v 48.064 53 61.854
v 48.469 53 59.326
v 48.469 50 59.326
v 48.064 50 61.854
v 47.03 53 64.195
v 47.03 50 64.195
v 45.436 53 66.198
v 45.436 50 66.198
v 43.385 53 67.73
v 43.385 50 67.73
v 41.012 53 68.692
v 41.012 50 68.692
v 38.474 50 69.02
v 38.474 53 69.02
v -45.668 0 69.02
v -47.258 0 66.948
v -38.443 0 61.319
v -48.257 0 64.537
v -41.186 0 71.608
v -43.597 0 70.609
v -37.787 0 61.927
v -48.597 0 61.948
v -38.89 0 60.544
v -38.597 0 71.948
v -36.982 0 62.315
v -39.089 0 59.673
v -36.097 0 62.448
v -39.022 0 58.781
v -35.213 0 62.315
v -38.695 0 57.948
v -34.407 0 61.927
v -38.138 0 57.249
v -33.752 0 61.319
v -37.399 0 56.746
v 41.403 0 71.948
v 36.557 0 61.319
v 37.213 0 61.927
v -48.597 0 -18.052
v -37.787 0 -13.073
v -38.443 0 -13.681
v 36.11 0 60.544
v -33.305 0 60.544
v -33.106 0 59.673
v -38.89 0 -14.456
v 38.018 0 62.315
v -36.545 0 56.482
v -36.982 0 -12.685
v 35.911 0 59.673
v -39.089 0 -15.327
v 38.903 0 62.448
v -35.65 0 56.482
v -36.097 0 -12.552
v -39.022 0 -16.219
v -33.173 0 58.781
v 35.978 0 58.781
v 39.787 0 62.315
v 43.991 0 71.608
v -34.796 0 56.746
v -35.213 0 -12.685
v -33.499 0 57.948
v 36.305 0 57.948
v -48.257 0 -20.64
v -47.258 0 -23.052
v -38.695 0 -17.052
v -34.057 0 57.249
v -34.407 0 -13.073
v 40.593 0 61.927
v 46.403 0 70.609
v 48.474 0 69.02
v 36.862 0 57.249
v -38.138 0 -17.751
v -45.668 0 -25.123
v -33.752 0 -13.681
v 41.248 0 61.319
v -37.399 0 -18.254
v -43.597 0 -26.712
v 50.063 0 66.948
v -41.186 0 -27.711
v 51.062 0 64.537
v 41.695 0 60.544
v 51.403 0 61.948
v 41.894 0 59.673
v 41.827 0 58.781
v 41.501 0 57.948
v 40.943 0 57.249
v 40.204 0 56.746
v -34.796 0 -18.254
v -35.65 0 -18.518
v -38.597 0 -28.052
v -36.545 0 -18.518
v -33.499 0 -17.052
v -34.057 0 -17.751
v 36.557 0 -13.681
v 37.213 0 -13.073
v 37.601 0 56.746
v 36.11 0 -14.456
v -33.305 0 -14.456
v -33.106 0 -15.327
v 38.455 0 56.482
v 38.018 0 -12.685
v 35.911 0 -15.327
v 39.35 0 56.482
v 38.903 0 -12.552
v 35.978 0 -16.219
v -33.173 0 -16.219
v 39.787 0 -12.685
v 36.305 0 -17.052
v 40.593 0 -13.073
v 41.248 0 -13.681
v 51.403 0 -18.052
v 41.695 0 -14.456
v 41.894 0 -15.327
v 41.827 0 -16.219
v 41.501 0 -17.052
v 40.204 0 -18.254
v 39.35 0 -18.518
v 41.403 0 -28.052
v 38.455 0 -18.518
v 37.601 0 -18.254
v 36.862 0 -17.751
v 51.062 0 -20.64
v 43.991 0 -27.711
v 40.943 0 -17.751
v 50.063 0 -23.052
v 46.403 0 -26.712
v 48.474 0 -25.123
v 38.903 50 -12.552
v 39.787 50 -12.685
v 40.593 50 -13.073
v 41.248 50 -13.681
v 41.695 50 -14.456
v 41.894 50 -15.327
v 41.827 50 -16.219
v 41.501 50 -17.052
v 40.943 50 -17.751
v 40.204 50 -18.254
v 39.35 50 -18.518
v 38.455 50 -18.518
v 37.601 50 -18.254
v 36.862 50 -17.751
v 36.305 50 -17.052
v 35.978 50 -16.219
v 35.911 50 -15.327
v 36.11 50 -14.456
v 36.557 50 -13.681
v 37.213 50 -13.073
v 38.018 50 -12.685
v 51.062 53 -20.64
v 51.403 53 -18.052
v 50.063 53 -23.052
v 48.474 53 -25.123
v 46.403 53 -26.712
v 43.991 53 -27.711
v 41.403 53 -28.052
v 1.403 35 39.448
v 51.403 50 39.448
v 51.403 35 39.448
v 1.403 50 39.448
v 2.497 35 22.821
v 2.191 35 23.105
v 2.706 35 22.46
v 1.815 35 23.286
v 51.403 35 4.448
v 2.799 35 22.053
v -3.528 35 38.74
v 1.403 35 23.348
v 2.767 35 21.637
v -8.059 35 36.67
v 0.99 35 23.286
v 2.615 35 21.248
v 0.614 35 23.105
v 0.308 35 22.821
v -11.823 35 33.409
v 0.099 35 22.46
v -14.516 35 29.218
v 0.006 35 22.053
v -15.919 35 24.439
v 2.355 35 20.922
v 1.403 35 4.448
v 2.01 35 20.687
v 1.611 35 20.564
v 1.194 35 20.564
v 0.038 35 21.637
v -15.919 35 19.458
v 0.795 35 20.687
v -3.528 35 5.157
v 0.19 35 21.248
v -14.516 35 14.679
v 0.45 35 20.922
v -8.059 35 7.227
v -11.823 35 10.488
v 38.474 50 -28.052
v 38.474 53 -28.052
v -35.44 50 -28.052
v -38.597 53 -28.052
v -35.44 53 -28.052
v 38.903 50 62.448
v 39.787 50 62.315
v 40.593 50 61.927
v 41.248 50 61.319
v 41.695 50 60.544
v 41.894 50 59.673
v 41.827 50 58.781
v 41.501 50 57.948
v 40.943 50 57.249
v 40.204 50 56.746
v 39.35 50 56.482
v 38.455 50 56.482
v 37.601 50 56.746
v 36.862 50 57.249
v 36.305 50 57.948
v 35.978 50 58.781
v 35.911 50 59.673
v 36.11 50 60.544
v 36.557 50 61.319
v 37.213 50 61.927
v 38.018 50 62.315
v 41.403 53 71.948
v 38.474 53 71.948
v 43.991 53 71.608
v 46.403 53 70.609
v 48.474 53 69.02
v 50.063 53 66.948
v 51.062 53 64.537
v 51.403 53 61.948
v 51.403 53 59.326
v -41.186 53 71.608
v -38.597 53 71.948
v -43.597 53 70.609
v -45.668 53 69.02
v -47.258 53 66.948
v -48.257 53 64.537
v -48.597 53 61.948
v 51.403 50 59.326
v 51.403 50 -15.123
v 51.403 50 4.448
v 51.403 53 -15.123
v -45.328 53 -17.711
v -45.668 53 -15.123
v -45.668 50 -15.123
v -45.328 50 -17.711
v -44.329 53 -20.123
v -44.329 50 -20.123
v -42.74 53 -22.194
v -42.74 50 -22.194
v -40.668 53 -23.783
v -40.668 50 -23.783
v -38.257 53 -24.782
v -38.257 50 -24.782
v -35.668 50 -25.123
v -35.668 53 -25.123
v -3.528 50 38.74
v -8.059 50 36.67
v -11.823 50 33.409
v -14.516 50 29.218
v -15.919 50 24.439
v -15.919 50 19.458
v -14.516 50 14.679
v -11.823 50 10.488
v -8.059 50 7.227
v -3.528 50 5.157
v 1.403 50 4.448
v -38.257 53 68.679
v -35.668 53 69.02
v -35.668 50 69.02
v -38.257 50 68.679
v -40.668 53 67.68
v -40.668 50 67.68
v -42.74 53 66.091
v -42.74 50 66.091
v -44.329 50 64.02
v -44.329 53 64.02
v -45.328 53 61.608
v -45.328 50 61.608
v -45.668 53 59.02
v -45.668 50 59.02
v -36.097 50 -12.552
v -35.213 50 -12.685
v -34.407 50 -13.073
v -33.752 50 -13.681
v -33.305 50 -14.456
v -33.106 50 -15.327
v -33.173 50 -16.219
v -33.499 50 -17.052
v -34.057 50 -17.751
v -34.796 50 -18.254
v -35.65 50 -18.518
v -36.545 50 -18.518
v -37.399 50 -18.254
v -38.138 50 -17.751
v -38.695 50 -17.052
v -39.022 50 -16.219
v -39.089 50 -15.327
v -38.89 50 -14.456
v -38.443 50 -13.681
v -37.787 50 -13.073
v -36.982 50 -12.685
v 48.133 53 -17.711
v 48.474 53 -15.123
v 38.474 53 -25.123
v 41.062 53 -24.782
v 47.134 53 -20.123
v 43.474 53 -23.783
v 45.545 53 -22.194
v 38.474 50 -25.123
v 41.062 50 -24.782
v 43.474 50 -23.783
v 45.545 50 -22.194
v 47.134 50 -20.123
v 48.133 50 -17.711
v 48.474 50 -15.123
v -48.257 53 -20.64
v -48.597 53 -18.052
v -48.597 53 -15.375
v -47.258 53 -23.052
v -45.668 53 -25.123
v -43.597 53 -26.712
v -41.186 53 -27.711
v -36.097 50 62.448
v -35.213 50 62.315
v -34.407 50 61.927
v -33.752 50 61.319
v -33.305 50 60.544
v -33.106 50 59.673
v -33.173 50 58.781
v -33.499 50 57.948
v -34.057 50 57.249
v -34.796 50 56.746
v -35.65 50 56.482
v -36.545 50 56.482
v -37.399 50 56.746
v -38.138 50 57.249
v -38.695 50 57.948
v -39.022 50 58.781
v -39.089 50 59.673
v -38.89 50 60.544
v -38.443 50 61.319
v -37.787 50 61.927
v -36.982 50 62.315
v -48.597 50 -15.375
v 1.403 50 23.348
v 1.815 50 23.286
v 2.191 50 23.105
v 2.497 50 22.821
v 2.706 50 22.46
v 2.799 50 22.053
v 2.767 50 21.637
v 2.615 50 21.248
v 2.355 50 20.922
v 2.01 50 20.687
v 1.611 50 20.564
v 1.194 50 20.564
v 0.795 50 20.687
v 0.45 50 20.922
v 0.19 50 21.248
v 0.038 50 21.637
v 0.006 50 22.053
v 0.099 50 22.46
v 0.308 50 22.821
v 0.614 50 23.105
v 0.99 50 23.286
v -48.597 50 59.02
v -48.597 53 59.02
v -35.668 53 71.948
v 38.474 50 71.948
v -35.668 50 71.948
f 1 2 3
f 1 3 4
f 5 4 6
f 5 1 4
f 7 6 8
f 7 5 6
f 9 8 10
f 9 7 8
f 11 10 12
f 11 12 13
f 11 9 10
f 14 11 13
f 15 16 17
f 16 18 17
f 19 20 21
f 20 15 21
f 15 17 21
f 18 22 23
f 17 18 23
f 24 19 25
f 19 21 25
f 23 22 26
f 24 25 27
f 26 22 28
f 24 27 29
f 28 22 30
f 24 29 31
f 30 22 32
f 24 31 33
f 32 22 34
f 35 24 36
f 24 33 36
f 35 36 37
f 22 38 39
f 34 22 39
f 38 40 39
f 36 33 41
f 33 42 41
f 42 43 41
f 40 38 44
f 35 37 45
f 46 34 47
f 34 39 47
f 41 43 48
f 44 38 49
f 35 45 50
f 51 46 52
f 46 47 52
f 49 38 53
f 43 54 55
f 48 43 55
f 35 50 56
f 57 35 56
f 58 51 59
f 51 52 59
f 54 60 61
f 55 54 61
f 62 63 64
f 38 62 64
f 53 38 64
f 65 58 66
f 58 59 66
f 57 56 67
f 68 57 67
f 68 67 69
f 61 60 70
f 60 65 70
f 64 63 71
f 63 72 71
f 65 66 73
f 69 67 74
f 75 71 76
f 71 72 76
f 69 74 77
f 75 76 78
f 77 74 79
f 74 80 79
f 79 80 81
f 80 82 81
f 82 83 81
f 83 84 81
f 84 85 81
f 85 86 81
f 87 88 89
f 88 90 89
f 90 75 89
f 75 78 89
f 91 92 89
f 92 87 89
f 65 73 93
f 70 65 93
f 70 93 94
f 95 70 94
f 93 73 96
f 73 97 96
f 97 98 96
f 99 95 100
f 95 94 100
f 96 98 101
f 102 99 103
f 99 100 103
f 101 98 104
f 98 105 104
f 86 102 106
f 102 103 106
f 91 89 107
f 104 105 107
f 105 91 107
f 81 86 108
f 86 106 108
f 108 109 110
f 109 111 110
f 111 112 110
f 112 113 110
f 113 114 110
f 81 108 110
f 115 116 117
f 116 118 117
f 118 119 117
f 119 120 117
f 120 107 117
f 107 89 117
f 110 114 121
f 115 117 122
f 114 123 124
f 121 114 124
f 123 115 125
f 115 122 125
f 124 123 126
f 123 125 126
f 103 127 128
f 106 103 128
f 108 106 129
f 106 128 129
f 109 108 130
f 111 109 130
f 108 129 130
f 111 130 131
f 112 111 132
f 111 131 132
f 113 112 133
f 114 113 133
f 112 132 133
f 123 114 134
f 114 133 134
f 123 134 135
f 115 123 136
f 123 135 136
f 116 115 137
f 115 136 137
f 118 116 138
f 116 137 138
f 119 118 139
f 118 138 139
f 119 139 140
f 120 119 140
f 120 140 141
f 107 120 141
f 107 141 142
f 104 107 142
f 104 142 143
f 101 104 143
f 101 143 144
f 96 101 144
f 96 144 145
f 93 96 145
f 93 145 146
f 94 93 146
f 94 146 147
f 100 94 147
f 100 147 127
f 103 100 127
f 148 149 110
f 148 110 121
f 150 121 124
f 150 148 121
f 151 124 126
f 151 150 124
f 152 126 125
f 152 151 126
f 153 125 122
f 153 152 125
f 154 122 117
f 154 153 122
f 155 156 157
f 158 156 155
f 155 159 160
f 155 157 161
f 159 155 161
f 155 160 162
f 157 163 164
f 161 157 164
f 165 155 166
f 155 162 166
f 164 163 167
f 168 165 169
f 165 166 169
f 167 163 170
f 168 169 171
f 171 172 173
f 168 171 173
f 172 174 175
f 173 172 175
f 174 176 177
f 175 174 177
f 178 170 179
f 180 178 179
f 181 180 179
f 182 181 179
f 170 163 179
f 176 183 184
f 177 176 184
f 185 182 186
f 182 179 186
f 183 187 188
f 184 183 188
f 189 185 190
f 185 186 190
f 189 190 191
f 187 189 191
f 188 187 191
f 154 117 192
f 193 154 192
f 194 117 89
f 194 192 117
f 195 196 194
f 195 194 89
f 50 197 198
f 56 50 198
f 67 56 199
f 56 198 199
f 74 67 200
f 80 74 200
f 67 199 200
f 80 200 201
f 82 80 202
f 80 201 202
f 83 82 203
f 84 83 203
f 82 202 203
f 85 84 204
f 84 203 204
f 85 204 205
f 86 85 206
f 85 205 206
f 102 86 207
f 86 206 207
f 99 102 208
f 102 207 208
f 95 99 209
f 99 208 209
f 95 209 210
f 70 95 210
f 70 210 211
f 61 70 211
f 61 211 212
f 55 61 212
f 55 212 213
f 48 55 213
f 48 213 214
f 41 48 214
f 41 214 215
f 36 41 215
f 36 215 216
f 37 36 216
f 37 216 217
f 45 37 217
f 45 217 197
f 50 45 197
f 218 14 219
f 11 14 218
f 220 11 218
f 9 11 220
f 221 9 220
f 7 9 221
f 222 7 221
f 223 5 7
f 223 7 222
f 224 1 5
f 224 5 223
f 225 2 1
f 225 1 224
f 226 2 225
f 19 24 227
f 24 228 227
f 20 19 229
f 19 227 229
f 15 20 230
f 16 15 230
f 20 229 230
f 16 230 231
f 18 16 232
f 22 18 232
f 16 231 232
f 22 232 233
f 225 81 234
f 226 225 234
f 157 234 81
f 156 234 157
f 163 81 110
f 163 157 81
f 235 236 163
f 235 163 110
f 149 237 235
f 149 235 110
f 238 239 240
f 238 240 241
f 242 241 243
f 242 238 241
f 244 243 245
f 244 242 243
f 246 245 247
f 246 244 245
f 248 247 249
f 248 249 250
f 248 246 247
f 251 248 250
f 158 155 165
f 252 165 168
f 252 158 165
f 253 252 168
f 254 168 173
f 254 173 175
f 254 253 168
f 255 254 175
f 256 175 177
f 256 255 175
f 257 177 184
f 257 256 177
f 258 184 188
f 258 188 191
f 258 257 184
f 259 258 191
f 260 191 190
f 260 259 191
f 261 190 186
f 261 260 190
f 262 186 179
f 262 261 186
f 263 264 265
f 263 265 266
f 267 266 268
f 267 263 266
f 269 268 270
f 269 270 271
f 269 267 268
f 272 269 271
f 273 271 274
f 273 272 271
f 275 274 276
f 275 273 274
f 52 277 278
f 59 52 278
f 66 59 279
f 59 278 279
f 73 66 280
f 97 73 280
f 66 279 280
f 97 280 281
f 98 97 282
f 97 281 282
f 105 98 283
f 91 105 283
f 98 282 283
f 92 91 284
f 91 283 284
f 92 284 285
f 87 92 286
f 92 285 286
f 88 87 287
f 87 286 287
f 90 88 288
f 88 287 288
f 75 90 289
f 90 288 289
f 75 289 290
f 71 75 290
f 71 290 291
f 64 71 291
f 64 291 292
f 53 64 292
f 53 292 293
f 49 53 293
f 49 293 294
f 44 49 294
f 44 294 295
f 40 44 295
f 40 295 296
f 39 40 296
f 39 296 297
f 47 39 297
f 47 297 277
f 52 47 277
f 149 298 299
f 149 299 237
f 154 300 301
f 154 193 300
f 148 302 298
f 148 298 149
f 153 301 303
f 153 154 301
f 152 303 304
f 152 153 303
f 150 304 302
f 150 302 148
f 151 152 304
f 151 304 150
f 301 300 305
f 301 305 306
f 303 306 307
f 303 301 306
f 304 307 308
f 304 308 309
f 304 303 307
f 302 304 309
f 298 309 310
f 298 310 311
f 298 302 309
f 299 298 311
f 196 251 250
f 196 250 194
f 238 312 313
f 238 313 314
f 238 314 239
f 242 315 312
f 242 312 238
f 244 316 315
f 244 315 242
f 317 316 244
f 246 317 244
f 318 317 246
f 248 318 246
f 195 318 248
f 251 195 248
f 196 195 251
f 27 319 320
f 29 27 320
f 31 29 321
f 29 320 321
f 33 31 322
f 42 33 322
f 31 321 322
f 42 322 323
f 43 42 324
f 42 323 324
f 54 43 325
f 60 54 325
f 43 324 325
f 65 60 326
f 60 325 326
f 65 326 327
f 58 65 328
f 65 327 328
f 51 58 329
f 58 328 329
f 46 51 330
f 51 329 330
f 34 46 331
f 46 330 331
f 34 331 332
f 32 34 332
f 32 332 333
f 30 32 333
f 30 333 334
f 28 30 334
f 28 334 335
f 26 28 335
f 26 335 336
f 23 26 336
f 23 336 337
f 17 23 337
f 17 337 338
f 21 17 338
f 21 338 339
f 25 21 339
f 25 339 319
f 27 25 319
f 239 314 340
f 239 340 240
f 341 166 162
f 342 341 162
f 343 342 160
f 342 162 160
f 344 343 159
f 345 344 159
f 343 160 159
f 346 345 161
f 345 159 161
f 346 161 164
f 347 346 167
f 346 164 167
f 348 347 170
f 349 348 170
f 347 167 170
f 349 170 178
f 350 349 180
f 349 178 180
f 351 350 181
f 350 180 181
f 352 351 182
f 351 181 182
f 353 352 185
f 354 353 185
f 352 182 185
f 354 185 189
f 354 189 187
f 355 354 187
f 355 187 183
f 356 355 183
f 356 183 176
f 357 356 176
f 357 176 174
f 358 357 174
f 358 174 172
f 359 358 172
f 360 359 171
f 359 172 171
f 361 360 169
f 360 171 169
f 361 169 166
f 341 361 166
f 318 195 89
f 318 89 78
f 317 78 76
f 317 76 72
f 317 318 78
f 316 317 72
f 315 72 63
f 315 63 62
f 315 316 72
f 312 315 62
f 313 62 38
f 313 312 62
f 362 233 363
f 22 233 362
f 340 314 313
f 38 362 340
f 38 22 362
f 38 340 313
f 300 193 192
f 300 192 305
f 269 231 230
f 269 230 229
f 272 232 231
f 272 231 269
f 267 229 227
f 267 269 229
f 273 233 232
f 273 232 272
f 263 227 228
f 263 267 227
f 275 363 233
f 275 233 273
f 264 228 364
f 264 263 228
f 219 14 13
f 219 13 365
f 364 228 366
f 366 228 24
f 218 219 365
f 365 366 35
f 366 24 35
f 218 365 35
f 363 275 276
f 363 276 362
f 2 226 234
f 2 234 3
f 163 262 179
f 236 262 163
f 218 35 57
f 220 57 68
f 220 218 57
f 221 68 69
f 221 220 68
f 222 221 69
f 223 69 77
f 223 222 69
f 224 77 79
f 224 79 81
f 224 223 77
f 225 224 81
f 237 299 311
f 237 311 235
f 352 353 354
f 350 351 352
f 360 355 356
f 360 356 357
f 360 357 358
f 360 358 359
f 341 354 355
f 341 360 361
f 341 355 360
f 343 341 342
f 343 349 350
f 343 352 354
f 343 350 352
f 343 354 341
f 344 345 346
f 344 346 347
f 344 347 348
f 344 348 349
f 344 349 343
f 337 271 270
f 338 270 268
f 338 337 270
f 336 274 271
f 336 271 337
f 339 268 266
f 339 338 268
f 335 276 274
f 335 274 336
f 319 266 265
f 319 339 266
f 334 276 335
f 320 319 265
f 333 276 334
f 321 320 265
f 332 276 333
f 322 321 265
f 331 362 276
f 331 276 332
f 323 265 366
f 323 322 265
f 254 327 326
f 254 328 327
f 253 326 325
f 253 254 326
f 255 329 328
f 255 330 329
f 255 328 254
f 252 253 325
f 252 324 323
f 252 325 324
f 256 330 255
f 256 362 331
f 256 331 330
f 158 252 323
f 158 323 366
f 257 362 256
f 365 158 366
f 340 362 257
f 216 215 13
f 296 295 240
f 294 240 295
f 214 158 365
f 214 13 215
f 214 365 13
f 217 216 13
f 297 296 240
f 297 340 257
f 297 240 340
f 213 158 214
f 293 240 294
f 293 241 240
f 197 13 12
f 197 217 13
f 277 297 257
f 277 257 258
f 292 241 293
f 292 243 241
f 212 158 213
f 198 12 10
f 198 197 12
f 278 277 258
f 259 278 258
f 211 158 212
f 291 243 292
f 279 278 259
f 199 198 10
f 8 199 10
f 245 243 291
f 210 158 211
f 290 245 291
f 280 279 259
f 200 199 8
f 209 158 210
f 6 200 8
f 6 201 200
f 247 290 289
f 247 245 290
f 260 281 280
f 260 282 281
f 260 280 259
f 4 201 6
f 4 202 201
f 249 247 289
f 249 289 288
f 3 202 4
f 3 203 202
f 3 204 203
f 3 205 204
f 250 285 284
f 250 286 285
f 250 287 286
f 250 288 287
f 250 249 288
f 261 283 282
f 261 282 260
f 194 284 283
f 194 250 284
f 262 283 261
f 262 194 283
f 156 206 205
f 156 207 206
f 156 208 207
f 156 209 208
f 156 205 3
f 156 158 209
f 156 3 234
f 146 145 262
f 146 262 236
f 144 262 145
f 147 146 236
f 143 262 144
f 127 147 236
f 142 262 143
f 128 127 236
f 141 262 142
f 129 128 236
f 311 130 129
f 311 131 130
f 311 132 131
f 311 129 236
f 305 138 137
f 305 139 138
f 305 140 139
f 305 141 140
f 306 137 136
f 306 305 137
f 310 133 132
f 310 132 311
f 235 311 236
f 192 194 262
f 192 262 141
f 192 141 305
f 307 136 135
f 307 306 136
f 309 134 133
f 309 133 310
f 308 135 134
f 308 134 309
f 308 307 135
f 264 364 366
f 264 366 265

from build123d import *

# Parameters (mm, degrees)
SKETCH1_W           = 100
SKETCH1_H           = 100
BOSS_EXTRUDE1_DEPTH = 50
CUT_EXTRUDE1_DEPTH  = 12
SKETCH4_R           = 3
CUT_EXTRUDE2_DEPTH  = 100
CUT_EXTRUDE3_DEPTH  = 50
BOSS_EXTRUDE4_START = 3
BOSS_EXTRUDE4_DEPTH = 3
CUT_EXTRUDE4_DEPTH  = 15
SKETCH7_R           = 1.4
BOSS_EXTRUDE5_DEPTH = 15


with BuildPart() as part:
    # Sketch1 → Boss-Extrude1 (new body)
    with BuildSketch(Plane(origin=(0, 0, 0), x_dir=(1, 0, 0), z_dir=(0, 1, 0))):
        with Locations((1.40257771, -21.948445792)):
            Rectangle(SKETCH1_W, SKETCH1_H)
    extrude(amount=BOSS_EXTRUDE1_DEPTH)

    # Sketch2 → Cut-Extrude1 (cut)
    with BuildSketch(Plane(origin=(0, 50, 0), x_dir=(1, 0, 0), z_dir=(0, 1, 0))):
        with BuildLine():
            Line((1.40257771, -4.448445792), (51.40257771, -4.448445792))
            ThreePointArc((51.40257771, -4.448445792), (68.90257771, -21.948445792), (51.40257771, -39.448445792))
            Line((51.40257771, -39.448445792), (1.40257771, -39.448445792))
            ThreePointArc((1.40257771, -39.448445792), (-16.09742229, -21.948445792), (1.40257771, -4.448445792))
        make_face()
    extrude(amount=-CUT_EXTRUDE1_DEPTH, mode=Mode.SUBTRACT)

    # Sketch4 → Cut-Extrude2 (cut)
    with BuildSketch(Plane(origin=(0, 50, 0), x_dir=(1, 0, 0), z_dir=(0, 1, 0))):
        with Locations((38.90257771, 15.551554208)):
            Circle(SKETCH4_R)
        with Locations((-36.09742229, 15.551554208)):
            Circle(SKETCH4_R)
        with Locations((-36.09742229, -59.448445792)):
            Circle(SKETCH4_R)
        with Locations((38.90257771, -59.448445792)):
            Circle(SKETCH4_R)
    extrude(amount=-CUT_EXTRUDE2_DEPTH, mode=Mode.SUBTRACT)

    # Sketch5 → Cut-Extrude3 (cut)
    with BuildSketch(Plane(origin=(0, 50, 0), x_dir=(1, 0, 0), z_dir=(0, 1, 0))):
        with BuildLine():
            Line((-48.59742229, -61.948445792), (-48.59742229, -71.948445792))
            Line((-48.59742229, -71.948445792), (-38.59742229, -71.948445792))
            ThreePointArc((-38.59742229, -71.948445792), (-45.668490101, -69.019513604), (-48.59742229, -61.948445792))
        make_face()
        with BuildLine():
            Line((-48.59742229, 28.051554208), (-38.59742229, 28.051554208))
            ThreePointArc((-38.59742229, 28.051554208), (-45.668490101, 25.12262202), (-48.59742229, 18.051554208))
            Line((-48.59742229, 18.051554208), (-48.59742229, 28.051554208))
        make_face()
        with BuildLine():
            Line((51.40257771, 28.051554208), (51.40257771, 18.051554208))
            ThreePointArc((51.40257771, 18.051554208), (48.473645522, 25.12262202), (41.40257771, 28.051554208))
            Line((41.40257771, 28.051554208), (51.40257771, 28.051554208))
        make_face()
        with BuildLine():
            Line((51.40257771, -61.948445792), (51.40257771, -71.948445792))
            Line((51.40257771, -71.948445792), (41.40257771, -71.948445792))
            ThreePointArc((41.40257771, -71.948445792), (48.473645522, -69.019513604), (51.40257771, -61.948445792))
        make_face()
    extrude(amount=-CUT_EXTRUDE3_DEPTH, mode=Mode.SUBTRACT)

    # Sketch6 → Boss-Extrude4 (add)
    with BuildSketch(Plane(origin=(0, 50, 0), x_dir=(1, 0, 0), z_dir=(0, 1, 0)).offset(BOSS_EXTRUDE4_START)):
        with BuildLine():
            ThreePointArc((38.473645522, 25.12262202), (45.544713334, 22.193689831), (48.473645522, 15.12262202))
            Line((48.473645522, 15.12262202), (51.40257771, 15.12262202))
            Line((51.40257771, 15.12262202), (51.40257771, 18.051554208))
            ThreePointArc((51.40257771, 18.051554208), (48.473645522, 25.12262202), (41.40257771, 28.051554208))
            Line((41.40257771, 28.051554208), (38.473645522, 28.051554208))
            Line((38.473645522, 28.051554208), (38.473645522, 25.12262202))
        make_face()
        with BuildLine():
            Line((-45.668490101, -59.019513604), (-48.59742229, -59.019513604))
            Line((-48.59742229, -59.019513604), (-48.59742229, -61.948445792))
            ThreePointArc((-48.59742229, -61.948445792), (-45.668490101, -69.019513604), (-38.59742229, -71.948445792))
            Line((-38.59742229, -71.948445792), (-35.668490101, -71.948445792))
            Line((-35.668490101, -71.948445792), (-35.668490101, -69.019513604))
            ThreePointArc((-35.668490101, -69.019513604), (-42.739557913, -66.090581416), (-45.668490101, -59.019513604))
        make_face()
        with BuildLine():
            Line((-35.668490101, 25.12262202), (-35.440476138, 28.051554208))
            Line((-35.440476138, 28.051554208), (-38.59742229, 28.051554208))
            ThreePointArc((-38.59742229, 28.051554208), (-45.668490101, 25.12262202), (-48.59742229, 18.051554208))
            Line((-48.59742229, 18.051554208), (-48.59742229, 15.374965532))
            Line((-48.59742229, 15.374965532), (-45.668490101, 15.12262202))
            ThreePointArc((-45.668490101, 15.12262202), (-42.739557913, 22.193689831), (-35.668490101, 25.12262202))
        make_face()
        with BuildLine():
            Line((51.40257771, -59.325952065), (48.468949193, -59.325952065))
            ThreePointArc((48.468949193, -59.325952065), (45.435528005, -66.198106245), (38.473645522, -69.019513604))
            Line((38.473645522, -69.019513604), (38.473645522, -71.948445792))
            Line((38.473645522, -71.948445792), (41.40257771, -71.948445792))
            ThreePointArc((41.40257771, -71.948445792), (48.473645522, -69.019513604), (51.40257771, -61.948445792))
            Line((51.40257771, -61.948445792), (51.40257771, -59.325952065))
        make_face()
    extrude(amount=-BOSS_EXTRUDE4_DEPTH)

    # Sketch2<2> → Cut-Extrude4 (cut)
    with BuildSketch(Plane(origin=(0, 50, 0), x_dir=(1, 0, 0), z_dir=(0, 1, 0))):
        with BuildLine():
            Line((1.40257771, -4.448445792), (51.40257771, -4.448445792))
            ThreePointArc((51.40257771, -4.448445792), (68.90257771, -21.948445792), (51.40257771, -39.448445792))
            Line((51.40257771, -39.448445792), (1.40257771, -39.448445792))
            ThreePointArc((1.40257771, -39.448445792), (-16.09742229, -21.948445792), (1.40257771, -4.448445792))
        make_face()
    extrude(amount=-CUT_EXTRUDE4_DEPTH, mode=Mode.SUBTRACT)

    # Sketch7 → Boss-Extrude5 (add)
    with BuildSketch(Plane(origin=(0, 35, 0), x_dir=(1, 0, 0), z_dir=(0, 1, 0))):
        with Locations((1.40257771, -21.948445792)):
            Circle(SKETCH7_R)
    extrude(amount=BOSS_EXTRUDE5_DEPTH)


solid = part.part
